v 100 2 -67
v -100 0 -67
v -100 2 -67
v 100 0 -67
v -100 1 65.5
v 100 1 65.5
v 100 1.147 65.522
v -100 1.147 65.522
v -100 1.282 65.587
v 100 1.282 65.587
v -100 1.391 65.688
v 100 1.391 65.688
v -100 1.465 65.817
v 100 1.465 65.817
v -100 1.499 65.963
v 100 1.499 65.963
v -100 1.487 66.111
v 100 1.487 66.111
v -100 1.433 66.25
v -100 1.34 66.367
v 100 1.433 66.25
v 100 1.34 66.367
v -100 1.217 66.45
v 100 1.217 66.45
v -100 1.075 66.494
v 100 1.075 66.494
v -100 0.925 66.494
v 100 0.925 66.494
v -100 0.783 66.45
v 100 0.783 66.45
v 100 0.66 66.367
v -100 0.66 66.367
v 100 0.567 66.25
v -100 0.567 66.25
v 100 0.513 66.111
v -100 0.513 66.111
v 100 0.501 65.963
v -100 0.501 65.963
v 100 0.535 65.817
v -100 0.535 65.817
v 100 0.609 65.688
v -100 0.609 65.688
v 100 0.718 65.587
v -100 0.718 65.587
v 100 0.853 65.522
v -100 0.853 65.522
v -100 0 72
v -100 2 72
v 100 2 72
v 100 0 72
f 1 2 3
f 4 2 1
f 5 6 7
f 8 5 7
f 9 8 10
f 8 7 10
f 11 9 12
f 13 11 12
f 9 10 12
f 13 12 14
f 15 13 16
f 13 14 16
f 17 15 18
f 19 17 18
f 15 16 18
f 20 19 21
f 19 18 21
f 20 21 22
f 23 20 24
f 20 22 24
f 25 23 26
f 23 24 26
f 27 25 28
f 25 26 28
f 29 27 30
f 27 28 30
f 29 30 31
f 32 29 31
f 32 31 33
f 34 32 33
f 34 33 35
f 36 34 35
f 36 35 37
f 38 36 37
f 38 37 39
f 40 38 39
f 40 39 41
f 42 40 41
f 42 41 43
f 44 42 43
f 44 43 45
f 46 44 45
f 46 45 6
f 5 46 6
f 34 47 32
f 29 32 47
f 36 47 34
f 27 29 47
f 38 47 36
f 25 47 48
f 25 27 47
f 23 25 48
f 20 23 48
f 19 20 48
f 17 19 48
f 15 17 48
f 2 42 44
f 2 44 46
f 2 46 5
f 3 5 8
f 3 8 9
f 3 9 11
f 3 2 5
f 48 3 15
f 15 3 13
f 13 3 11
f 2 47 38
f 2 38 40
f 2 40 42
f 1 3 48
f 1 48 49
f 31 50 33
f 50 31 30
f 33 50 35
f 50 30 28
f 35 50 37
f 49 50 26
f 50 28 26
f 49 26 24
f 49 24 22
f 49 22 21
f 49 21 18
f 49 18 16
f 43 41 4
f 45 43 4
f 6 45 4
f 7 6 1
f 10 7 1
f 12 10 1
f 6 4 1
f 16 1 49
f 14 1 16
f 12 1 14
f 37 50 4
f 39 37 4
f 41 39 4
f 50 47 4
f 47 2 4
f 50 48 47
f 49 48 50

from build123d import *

# Parameters (mm, degrees)
SKETCH1_W           = 200
SKETCH1_H           = 134
BOSS_EXTRUDE1_DEPTH = 2
SKETCH2_R           = 0.5
CUT_EXTRUDE1_DEPTH  = 211.933638854
SKETCH3_W           = 200
SKETCH3_H           = 2
BOSS_EXTRUDE2_DEPTH = 5


with BuildPart() as part:
    # Sketch1 → Boss-Extrude1 (new body)
    with BuildSketch(Plane(origin=(0, 0, 0), x_dir=(1, 0, 0), z_dir=(0, 1, 0))):
        Rectangle(SKETCH1_W, SKETCH1_H)
    extrude(amount=BOSS_EXTRUDE1_DEPTH)

    # Sketch2 → Cut-Extrude1 (cut, through all)
    with BuildSketch(Plane(origin=(100, 0, 0), x_dir=(0, 0, -1), z_dir=(1, 0, 0))):
        with Locations((-66, 1)):
            Circle(SKETCH2_R)
    extrude(amount=-CUT_EXTRUDE1_DEPTH, mode=Mode.SUBTRACT)

    # Sketch3 → Boss-Extrude2 (add)
    with BuildSketch(Plane.XY.offset(67)):
        with Locations((0, 1)):
            Rectangle(SKETCH3_W, SKETCH3_H)
    extrude(amount=BOSS_EXTRUDE2_DEPTH)


solid = part.part
